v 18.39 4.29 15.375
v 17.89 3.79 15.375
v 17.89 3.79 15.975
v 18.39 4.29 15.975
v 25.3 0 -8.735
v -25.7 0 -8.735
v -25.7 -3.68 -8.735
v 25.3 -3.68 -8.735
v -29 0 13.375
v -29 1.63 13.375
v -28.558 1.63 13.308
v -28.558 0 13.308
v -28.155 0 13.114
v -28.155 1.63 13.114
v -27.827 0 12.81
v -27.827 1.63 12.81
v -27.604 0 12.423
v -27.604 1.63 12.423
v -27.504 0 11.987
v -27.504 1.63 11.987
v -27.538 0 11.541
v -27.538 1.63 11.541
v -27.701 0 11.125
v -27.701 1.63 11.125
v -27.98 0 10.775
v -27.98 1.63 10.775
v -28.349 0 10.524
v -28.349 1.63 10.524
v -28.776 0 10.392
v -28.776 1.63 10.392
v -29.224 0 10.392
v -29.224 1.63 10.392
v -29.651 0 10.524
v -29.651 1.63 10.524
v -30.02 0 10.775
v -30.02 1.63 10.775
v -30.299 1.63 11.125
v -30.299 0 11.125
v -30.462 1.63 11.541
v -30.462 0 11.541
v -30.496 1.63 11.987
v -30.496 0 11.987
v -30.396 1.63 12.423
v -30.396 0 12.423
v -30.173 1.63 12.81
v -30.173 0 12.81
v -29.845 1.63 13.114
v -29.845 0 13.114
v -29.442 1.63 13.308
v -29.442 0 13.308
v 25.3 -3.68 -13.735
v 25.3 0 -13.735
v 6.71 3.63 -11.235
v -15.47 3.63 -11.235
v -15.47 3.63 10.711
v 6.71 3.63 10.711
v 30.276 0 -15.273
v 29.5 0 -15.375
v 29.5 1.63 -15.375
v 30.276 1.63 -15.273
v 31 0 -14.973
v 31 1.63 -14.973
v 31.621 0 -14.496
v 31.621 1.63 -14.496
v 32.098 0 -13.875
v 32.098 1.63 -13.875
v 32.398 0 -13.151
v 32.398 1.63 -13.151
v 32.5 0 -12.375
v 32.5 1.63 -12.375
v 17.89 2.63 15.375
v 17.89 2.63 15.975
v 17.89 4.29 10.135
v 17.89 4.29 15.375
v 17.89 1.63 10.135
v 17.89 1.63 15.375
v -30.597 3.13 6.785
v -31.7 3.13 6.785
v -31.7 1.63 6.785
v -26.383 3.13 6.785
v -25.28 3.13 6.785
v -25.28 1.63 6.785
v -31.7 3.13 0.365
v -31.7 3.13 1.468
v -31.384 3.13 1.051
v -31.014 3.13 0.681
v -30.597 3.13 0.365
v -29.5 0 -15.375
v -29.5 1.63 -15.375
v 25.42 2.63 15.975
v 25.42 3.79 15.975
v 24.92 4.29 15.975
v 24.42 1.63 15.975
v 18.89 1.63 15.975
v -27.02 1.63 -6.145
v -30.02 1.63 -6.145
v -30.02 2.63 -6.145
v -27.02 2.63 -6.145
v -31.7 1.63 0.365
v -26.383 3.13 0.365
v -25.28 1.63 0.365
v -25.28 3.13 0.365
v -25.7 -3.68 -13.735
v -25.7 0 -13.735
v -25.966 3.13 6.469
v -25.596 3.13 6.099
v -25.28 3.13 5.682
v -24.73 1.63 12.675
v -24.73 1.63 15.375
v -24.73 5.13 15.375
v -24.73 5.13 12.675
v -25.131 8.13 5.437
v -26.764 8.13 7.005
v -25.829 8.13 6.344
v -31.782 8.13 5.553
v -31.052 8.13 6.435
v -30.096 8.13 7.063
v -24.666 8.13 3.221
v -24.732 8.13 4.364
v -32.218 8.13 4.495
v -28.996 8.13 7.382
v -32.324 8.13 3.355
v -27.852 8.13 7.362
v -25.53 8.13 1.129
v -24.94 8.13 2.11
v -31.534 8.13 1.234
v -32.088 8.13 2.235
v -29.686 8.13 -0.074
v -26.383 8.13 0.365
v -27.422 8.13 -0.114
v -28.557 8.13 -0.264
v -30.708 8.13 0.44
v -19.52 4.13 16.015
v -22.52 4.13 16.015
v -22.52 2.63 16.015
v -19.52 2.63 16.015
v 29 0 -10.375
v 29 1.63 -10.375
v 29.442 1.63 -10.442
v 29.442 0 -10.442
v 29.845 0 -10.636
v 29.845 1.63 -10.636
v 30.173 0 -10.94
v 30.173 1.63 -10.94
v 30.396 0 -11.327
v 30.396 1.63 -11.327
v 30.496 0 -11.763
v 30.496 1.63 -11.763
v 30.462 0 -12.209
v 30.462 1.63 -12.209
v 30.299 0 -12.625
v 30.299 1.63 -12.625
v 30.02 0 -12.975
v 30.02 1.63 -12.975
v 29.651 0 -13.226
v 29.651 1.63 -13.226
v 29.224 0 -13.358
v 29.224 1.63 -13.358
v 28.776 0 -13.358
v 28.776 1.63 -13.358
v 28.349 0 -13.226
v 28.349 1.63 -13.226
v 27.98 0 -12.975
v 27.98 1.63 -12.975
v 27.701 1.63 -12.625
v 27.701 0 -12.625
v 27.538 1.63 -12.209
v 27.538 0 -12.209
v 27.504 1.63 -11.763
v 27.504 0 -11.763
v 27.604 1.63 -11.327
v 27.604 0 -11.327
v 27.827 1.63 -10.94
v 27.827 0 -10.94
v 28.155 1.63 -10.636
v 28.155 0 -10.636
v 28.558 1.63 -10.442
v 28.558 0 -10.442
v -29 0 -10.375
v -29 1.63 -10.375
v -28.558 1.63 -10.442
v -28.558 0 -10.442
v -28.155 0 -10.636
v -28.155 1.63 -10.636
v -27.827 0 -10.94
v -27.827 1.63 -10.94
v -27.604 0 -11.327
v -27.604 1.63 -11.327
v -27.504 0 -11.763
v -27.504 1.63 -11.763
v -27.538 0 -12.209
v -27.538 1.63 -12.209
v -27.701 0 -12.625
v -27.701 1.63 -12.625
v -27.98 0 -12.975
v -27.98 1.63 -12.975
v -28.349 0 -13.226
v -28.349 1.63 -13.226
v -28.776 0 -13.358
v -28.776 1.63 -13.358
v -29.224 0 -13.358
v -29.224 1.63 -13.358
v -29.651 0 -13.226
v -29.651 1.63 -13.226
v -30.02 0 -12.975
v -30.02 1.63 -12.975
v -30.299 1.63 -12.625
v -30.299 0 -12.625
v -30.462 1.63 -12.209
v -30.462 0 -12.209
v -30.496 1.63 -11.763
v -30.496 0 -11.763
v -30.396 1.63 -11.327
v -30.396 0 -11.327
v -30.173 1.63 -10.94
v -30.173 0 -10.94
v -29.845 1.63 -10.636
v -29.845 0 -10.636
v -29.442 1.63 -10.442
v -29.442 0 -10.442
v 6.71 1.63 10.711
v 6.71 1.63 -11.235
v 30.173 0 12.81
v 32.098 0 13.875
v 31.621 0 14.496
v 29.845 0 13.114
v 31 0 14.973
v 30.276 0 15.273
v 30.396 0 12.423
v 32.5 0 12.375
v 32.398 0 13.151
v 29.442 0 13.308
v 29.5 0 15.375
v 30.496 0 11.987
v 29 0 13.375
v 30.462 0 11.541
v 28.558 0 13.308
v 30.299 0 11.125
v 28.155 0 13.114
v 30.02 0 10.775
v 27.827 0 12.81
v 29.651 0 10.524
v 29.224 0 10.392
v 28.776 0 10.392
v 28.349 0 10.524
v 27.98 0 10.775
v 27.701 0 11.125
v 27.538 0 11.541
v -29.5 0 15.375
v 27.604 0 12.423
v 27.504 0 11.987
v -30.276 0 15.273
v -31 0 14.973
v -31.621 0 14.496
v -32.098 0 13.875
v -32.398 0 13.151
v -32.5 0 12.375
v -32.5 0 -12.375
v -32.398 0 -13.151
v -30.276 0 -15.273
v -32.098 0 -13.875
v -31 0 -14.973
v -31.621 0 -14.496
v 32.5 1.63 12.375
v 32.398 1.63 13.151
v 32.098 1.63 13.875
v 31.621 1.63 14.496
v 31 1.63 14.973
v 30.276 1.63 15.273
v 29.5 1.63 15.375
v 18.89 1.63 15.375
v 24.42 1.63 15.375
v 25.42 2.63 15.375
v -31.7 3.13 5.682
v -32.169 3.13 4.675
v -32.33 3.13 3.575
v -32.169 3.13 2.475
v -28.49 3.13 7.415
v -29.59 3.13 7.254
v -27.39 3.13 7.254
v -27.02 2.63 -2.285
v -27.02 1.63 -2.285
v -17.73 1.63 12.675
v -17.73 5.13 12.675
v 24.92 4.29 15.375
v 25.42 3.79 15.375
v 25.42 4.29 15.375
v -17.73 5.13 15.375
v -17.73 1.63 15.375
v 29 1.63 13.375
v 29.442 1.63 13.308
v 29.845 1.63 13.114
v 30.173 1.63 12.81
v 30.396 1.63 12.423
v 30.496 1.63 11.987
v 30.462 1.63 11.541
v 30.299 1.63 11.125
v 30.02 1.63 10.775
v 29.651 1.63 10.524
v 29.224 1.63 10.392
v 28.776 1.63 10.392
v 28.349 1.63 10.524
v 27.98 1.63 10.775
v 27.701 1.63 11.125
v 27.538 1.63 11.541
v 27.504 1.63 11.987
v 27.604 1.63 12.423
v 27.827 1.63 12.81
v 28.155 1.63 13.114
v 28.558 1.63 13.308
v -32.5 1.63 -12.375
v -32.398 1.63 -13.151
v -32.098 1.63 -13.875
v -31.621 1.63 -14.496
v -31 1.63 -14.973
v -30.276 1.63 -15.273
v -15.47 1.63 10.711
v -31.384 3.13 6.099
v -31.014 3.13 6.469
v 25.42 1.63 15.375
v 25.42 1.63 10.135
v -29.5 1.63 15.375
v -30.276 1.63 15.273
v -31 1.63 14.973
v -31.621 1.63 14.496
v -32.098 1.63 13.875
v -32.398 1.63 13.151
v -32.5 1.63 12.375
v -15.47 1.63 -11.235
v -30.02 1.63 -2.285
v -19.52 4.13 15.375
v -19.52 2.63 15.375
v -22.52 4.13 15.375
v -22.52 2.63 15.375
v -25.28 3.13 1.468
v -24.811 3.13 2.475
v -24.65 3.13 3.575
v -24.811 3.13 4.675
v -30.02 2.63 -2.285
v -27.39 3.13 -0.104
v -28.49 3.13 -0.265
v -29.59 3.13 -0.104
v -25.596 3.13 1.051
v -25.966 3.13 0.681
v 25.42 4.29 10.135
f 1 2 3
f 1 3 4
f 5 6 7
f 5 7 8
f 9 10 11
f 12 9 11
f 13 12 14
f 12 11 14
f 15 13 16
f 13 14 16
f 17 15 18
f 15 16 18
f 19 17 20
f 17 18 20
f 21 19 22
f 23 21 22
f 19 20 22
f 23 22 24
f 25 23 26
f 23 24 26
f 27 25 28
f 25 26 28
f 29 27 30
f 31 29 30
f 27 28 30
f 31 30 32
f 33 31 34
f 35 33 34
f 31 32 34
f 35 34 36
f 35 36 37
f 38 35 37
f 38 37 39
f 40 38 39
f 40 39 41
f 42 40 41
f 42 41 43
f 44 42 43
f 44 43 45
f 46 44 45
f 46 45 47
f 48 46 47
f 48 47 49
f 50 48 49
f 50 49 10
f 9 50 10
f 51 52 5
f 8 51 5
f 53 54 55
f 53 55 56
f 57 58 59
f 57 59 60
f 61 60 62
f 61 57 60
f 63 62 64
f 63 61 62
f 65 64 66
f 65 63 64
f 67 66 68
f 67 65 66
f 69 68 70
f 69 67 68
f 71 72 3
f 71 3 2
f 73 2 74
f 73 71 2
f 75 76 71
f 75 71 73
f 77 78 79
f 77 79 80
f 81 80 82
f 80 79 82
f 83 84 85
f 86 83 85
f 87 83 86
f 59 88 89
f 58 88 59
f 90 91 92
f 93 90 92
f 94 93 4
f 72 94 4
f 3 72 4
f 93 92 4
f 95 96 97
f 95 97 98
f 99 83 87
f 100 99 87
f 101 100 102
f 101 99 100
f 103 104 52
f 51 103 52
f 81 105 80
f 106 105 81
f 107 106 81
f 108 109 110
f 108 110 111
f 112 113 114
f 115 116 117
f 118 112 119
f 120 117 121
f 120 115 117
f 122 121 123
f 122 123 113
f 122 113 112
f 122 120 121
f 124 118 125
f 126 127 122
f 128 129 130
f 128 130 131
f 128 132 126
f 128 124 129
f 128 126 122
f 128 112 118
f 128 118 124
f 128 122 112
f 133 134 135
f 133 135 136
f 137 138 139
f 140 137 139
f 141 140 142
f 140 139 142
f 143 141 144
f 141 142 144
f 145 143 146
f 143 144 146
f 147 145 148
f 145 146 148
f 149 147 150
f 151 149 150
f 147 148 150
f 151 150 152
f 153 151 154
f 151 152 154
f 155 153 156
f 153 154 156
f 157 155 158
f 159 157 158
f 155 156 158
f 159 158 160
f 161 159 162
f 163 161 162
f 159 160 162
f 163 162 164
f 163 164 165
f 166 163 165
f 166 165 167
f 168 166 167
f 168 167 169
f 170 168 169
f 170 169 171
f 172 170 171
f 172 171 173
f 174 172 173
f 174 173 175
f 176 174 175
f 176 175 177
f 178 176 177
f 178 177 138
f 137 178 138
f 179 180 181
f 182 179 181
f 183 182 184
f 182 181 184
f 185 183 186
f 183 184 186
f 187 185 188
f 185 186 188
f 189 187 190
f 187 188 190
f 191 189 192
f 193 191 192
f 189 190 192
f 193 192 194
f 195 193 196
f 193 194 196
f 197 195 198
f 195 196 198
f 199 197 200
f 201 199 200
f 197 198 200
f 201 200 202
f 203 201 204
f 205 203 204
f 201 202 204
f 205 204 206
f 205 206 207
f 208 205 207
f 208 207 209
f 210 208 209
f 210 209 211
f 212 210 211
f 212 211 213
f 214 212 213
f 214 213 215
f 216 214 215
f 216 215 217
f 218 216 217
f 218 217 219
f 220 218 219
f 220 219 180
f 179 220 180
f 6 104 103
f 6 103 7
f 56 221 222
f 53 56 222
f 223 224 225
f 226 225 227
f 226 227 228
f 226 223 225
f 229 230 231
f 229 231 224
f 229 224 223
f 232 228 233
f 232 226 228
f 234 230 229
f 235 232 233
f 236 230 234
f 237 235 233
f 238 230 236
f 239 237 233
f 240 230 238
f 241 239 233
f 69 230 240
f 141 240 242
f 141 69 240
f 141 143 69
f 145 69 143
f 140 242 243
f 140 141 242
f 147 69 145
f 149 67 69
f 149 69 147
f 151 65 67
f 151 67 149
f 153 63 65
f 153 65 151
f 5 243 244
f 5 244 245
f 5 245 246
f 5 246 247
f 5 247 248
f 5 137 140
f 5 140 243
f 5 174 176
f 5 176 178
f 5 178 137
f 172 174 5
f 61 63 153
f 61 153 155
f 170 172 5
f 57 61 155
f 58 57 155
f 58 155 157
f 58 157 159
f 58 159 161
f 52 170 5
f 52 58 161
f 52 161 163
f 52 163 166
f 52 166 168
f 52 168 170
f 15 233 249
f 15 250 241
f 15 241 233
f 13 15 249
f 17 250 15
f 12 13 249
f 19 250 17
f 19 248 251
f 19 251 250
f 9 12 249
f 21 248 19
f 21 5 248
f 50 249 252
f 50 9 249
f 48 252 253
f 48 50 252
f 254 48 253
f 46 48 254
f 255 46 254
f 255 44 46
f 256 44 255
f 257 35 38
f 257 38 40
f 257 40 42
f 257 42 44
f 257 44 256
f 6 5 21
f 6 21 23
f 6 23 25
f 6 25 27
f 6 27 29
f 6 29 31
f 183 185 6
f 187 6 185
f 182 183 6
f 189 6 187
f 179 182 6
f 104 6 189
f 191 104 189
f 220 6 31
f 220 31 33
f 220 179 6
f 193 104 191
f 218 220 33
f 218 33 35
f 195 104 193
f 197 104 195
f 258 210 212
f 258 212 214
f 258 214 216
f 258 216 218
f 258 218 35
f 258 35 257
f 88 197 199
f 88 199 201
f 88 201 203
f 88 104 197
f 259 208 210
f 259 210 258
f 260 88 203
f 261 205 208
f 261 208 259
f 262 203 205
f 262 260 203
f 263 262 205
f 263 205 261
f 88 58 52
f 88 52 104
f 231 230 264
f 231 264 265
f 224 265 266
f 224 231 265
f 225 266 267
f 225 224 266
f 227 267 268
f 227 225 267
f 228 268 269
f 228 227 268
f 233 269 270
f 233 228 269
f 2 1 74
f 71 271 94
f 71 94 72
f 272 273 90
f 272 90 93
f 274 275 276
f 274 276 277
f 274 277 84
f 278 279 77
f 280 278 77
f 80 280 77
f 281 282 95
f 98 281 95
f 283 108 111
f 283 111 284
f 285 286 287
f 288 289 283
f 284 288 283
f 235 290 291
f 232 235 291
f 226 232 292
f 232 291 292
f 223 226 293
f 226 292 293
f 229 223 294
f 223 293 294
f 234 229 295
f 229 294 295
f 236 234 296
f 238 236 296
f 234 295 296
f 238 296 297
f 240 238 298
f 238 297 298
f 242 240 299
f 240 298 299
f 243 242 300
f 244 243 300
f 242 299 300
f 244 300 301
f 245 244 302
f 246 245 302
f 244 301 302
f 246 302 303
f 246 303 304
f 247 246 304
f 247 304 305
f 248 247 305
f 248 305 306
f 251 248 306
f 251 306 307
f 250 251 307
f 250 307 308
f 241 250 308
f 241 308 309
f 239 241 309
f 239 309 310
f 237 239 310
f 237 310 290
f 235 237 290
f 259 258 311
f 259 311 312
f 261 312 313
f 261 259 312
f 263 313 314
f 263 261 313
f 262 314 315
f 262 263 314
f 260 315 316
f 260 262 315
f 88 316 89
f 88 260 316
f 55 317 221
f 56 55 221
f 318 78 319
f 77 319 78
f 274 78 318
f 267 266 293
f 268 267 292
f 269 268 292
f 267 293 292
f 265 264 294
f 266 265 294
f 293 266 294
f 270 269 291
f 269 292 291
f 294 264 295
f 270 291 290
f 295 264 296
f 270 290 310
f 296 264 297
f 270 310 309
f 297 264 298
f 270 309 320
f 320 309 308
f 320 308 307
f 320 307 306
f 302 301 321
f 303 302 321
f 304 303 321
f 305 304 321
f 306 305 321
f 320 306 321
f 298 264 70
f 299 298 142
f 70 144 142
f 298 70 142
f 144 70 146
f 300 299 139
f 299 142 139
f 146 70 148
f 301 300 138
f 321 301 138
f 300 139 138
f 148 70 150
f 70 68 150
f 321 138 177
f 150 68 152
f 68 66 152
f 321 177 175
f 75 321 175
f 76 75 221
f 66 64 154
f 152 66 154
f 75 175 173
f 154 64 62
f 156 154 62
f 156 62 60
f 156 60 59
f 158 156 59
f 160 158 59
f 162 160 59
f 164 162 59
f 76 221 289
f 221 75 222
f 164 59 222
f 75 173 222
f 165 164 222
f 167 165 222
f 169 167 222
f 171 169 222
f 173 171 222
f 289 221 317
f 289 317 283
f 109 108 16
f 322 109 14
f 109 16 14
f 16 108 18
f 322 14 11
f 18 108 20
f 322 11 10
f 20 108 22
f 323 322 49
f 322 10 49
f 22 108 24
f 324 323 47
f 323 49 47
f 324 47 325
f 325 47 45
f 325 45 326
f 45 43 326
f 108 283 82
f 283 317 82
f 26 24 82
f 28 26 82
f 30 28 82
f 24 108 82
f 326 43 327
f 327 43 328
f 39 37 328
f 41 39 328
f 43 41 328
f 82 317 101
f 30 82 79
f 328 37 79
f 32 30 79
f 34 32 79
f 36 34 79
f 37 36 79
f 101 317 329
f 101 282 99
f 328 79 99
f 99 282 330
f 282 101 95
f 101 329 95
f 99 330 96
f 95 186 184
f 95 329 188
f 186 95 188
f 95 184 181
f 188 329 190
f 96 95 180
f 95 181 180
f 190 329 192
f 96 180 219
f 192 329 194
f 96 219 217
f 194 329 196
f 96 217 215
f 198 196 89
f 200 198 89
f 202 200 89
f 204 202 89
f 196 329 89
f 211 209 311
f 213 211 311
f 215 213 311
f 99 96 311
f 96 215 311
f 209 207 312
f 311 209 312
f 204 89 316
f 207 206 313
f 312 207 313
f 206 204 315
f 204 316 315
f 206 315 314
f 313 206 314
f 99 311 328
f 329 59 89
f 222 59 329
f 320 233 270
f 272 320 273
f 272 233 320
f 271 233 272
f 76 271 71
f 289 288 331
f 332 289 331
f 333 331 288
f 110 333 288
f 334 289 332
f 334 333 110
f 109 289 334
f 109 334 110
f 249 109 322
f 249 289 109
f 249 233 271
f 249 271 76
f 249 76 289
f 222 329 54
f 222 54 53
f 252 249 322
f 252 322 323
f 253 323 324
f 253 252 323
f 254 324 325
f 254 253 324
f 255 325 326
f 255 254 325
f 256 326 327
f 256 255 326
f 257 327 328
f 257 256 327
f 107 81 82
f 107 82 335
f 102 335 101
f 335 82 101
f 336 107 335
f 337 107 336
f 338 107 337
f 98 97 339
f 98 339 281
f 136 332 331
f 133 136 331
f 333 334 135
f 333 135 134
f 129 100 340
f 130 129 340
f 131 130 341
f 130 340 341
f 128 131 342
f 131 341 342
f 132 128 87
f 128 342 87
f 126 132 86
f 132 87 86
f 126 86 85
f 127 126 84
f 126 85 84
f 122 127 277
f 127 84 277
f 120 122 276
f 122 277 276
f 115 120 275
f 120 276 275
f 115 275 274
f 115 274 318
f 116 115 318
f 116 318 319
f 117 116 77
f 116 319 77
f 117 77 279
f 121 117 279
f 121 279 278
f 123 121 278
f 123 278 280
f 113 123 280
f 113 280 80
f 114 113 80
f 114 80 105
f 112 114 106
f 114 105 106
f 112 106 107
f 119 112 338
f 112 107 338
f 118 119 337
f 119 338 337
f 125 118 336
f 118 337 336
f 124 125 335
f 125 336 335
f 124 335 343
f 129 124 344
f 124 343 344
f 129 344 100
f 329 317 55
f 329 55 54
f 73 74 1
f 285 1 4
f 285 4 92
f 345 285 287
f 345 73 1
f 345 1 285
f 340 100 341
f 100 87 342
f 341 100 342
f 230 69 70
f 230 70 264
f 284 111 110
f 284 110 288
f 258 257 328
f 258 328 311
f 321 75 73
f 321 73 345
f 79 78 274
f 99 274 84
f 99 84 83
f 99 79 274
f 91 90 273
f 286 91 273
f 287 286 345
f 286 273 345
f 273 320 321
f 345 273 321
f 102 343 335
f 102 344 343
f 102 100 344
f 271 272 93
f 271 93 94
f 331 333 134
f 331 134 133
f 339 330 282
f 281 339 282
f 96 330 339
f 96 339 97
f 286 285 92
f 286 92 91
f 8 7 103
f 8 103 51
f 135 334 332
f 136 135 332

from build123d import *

# Parameters (mm, degrees)
EXTRUDE_1_DEPTH     = 1.63
SKETCH_2_R          = 1.5
CUT_EXTRUDE_1_DEPTH = 36.99024208
SKETCH_8_W          = 51
SKETCH_8_H          = 5
EXTRUDE_6_DEPTH     = 3.68
SKETCH_9_W          = 7
SKETCH_9_H          = 2.7
EXTRUDE_7_DEPTH     = 3.5
SKETCH_10_W         = 7.53
SKETCH_10_H         = 5.24
EXTRUDE_8_DEPTH     = 2.66
SKETCH_11_W         = 22.18
SKETCH_11_H         = 21.945686578
EXTRUDE_9_DEPTH     = 2
SKETCH_12_W         = 6.42
SKETCH_12_H         = 6.42
EXTRUDE_10_DEPTH    = 1.5
SKETCH_13_W         = 3
SKETCH_13_H         = 3.86
EXTRUDE_11_DEPTH    = 1
SKETCH_14_R         = 3.84
EXTRUDE_12_DEPTH    = 5
SKETCH_15_W         = 3
SKETCH_15_H         = 1.5
EXTRUDE_13_DEPTH    = 0.64
EXTRUDE_14_DEPTH    = 0.6


with BuildPart() as part:
    # 草图1 → 凸台-拉伸1 (new body)
    with BuildSketch(Plane(origin=(0, 0, 0), x_dir=(1, 0, 0), z_dir=(0, 1, 0))):
        with BuildLine():
            Line((-29.5, 15.375), (29.5, 15.375))
            ThreePointArc((29.5, 15.375), (31.621320344, 14.496320344), (32.5, 12.375))
            Line((32.5, 12.375), (32.5, -12.375))
            ThreePointArc((32.5, -12.375), (31.621320344, -14.496320344), (29.5, -15.375))
            Line((29.5, -15.375), (-29.5, -15.375))
            ThreePointArc((-29.5, -15.375), (-31.621320344, -14.496320344), (-32.5, -12.375))
            Line((-32.5, -12.375), (-32.5, 12.375))
            ThreePointArc((-32.5, 12.375), (-31.621320344, 14.496320344), (-29.5, 15.375))
        make_face()
    extrude(amount=EXTRUDE_1_DEPTH)

    # 草图2 → 切除-拉伸1 (cut, through all)
    with BuildSketch(Plane(origin=(0, 1.63, 0), x_dir=(1, 0, 0), z_dir=(0, 1, 0))):
        with Locations(Location((-29, 11.875, 0), (0, 0, 270))):
            Circle(SKETCH_2_R)
        with Locations(Location((-29, -11.875, 0), (0, 0, 270))):
            Circle(SKETCH_2_R)
        with Locations(Location((29, -11.875, 0), (0, 0, 270))):
            Circle(SKETCH_2_R)
        with Locations(Location((29, 11.875, 0), (0, 0, 270))):
            Circle(SKETCH_2_R)
    extrude(amount=-CUT_EXTRUDE_1_DEPTH, mode=Mode.SUBTRACT)

    # 草图8 → 凸台-拉伸6 (add)
    with BuildSketch(Plane.XZ):
        with Locations((-0.2, -11.235)):
            Rectangle(SKETCH_8_W, SKETCH_8_H)
    extrude(amount=EXTRUDE_6_DEPTH)

    # 草图9 → 凸台-拉伸7 (add)
    with BuildSketch(Plane(origin=(0, 1.63, 0), x_dir=(1, 0, 0), z_dir=(0, 1, 0))):
        with Locations((-21.23, -14.025)):
            Rectangle(SKETCH_9_W, SKETCH_9_H)
    extrude(amount=EXTRUDE_7_DEPTH)

    # 草图10 → 凸台-拉伸8 (add)
    with BuildSketch(Plane(origin=(0, 1.63, 0), x_dir=(1, 0, 0), z_dir=(0, 1, 0))):
        with Locations((21.655, -12.755)):
            Rectangle(SKETCH_10_W, SKETCH_10_H)
    extrude(amount=EXTRUDE_8_DEPTH)

    # 草图11 → 凸台-拉伸9 (add)
    with BuildSketch(Plane(origin=(0, 1.63, 0), x_dir=(1, 0, 0), z_dir=(0, 1, 0))):
        with Locations((-4.38, 0.262156711)):
            Rectangle(SKETCH_11_W, SKETCH_11_H)
    extrude(amount=EXTRUDE_9_DEPTH)

    # 草图12 → 凸台-拉伸10 (add)
    with BuildSketch(Plane(origin=(0, 1.63, 0), x_dir=(1, 0, 0), z_dir=(0, 1, 0))):
        with Locations((-28.49, -3.575)):
            Rectangle(SKETCH_12_W, SKETCH_12_H)
    extrude(amount=EXTRUDE_10_DEPTH)

    # 草图13 → 凸台-拉伸11 (add)
    with BuildSketch(Plane(origin=(0, 1.63, 0), x_dir=(1, 0, 0), z_dir=(0, 1, 0))):
        with Locations((-28.52, 4.215)):
            Rectangle(SKETCH_13_W, SKETCH_13_H)
    extrude(amount=EXTRUDE_11_DEPTH)

    # 草图14 → 凸台-拉伸12 (add)
    with BuildSketch(Plane(origin=(0, 3.13, 0), x_dir=(1, 0, 0), z_dir=(0, 1, 0))):
        with Locations(Location((-28.49, -3.575, 0), (0, 0, 56.713583662))):
            Circle(SKETCH_14_R)
    extrude(amount=EXTRUDE_12_DEPTH)

    # 草图15 → 凸台-拉伸13 (add)
    with BuildSketch(Plane.XY.offset(15.375)):
        with Locations((-21.02, 3.38)):
            Rectangle(SKETCH_15_W, SKETCH_15_H)
    extrude(amount=EXTRUDE_13_DEPTH)

    # 草图16 → 凸台-拉伸14 (add)
    with BuildSketch(Plane.XY.offset(15.375)):
        Polygon((17.89, 3.79), (18.39, 4.29), (24.92, 4.29), (25.42, 3.79), (25.42, 2.63), (24.42, 1.63), (18.89, 1.63), (17.89, 2.63), align=None)
    extrude(amount=EXTRUDE_14_DEPTH)


solid = part.part
